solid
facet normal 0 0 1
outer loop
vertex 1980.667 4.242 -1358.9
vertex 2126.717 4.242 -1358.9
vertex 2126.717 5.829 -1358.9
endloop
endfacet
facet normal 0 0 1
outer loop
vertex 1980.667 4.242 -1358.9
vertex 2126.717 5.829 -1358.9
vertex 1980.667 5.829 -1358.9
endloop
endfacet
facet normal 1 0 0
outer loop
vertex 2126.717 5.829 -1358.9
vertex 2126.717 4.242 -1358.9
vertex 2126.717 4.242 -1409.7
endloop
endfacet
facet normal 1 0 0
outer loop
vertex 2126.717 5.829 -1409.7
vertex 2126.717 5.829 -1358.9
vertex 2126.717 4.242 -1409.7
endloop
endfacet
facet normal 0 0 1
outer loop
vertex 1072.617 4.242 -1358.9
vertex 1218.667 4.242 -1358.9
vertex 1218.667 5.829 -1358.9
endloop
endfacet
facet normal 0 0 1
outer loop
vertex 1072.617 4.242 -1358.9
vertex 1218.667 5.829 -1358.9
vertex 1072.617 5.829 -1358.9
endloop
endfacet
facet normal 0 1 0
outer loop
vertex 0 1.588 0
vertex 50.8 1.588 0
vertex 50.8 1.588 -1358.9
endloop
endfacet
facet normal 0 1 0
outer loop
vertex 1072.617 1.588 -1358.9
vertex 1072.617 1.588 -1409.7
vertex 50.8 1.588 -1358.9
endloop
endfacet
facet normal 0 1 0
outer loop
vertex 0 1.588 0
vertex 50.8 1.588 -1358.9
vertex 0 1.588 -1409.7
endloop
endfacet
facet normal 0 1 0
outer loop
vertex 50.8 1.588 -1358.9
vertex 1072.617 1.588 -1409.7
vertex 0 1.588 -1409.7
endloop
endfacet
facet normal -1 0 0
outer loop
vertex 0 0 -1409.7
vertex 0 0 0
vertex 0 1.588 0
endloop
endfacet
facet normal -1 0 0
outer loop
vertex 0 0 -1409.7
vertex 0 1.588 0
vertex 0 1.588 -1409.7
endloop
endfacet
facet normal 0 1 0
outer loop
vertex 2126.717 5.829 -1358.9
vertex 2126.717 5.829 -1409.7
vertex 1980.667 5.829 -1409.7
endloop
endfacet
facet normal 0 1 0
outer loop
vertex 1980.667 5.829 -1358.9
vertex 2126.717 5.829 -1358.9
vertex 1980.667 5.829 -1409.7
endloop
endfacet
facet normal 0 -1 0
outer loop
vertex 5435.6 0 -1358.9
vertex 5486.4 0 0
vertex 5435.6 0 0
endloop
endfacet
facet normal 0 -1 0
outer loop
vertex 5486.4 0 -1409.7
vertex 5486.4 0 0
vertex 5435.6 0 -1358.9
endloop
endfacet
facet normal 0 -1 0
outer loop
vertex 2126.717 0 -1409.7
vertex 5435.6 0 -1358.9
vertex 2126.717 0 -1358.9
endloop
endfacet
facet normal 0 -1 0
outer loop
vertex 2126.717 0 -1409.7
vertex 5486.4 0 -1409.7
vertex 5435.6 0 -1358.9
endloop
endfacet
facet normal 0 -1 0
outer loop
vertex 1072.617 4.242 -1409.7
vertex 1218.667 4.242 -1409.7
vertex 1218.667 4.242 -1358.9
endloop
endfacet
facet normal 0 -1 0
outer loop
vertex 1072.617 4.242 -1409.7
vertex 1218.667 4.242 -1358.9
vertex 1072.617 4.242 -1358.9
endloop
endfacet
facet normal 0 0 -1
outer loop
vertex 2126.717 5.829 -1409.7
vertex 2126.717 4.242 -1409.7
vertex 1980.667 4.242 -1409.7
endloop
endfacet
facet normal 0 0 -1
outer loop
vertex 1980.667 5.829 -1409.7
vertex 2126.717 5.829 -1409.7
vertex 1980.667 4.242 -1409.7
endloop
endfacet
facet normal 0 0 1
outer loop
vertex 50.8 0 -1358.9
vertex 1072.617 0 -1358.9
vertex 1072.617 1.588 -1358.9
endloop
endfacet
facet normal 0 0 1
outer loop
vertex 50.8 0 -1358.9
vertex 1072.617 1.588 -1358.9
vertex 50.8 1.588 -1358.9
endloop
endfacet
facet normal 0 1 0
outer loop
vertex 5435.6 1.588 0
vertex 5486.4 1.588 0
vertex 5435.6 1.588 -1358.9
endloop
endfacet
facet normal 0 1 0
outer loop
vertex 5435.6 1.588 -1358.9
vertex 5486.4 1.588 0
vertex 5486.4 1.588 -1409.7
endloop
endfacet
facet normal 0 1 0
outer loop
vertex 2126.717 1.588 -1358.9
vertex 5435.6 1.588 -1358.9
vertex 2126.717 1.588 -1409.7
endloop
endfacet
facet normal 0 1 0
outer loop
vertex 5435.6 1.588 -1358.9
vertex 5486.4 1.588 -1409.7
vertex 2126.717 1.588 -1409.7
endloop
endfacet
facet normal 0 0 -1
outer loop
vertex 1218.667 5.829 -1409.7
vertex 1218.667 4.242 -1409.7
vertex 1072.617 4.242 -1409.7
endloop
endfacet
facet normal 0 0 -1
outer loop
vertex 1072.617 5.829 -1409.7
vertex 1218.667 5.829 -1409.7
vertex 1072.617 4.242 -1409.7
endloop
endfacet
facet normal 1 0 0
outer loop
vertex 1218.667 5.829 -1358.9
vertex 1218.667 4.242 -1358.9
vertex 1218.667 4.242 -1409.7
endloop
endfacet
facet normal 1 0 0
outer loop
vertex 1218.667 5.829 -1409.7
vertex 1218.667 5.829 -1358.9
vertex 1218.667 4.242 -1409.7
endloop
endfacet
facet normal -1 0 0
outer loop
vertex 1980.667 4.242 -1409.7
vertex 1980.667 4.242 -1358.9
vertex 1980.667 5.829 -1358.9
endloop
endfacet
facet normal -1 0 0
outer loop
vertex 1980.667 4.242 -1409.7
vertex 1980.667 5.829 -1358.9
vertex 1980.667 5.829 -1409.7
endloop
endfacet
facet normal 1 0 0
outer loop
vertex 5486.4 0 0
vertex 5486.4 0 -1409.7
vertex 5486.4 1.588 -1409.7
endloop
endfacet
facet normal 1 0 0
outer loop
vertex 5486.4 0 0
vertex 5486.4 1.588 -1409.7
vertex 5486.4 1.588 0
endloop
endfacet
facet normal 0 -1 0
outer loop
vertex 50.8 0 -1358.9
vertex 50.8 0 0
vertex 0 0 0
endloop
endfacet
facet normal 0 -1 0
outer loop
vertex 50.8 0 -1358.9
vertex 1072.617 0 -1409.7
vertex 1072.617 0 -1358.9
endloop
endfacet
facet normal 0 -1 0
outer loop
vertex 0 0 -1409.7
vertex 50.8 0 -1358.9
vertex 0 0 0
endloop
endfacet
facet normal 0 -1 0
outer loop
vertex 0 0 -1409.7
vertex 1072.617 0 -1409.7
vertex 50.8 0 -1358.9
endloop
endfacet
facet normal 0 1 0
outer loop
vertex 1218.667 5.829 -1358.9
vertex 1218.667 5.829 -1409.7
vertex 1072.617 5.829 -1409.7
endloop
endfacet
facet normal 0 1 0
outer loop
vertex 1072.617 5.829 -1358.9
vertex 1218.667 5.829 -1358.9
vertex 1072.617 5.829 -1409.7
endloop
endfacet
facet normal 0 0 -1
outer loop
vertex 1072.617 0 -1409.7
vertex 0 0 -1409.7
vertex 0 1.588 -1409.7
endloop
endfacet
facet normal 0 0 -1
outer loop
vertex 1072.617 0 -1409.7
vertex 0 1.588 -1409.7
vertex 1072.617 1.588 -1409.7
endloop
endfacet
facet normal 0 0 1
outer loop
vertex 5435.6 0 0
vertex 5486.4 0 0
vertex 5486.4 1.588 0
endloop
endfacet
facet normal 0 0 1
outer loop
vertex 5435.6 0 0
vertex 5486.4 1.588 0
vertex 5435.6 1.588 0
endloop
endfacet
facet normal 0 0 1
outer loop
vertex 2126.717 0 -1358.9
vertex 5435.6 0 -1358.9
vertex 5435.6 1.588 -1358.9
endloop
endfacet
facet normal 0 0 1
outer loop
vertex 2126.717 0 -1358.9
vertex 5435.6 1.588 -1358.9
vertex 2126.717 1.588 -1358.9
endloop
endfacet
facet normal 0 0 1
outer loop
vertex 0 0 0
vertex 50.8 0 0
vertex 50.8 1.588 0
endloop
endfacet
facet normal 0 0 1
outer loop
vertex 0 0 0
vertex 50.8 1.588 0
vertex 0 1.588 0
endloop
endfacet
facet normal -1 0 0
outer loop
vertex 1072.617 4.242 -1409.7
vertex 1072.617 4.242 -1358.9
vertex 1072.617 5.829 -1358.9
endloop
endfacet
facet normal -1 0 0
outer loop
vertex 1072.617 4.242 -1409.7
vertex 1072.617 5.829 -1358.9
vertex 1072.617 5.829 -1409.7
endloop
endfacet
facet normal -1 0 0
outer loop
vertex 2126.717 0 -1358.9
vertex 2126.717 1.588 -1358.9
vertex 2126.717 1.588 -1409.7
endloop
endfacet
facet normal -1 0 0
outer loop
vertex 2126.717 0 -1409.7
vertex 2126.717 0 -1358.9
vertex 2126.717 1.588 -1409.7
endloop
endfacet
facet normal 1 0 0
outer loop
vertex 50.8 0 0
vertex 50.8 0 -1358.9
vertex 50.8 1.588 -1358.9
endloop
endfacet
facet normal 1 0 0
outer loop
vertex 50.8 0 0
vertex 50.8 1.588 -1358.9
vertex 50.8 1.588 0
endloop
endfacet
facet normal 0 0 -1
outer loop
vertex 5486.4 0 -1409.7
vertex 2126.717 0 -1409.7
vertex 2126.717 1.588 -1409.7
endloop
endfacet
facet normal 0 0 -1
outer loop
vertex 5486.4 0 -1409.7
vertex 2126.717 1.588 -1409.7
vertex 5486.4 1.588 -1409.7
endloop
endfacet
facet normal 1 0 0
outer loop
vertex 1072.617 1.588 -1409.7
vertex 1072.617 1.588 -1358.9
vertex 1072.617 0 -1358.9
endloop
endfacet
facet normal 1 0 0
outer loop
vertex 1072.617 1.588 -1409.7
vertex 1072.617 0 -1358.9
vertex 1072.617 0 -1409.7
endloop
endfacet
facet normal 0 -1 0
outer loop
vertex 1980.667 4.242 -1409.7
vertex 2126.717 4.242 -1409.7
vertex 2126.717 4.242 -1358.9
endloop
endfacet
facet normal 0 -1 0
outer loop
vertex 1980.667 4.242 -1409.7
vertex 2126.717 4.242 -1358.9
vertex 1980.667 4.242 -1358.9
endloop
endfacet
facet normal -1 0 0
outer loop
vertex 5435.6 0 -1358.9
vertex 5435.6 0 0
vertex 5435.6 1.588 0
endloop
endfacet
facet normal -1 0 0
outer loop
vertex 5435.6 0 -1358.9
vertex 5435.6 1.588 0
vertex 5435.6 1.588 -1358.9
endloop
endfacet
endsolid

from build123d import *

# Parameters (mm, degrees)
BOSS_EXTRUDE1_DEPTH     = 1.5875
SKETCH2_W               = 1054.1
SKETCH2_H               = 50.8
CUT_EXTRUDE1_DEPTH      = 1
CUT_EXTRUDE1_DEPTH_BACK = 2.5875
SKETCH3_W               = 146.05
SKETCH3_H               = 50.8
BOSS_EXTRUDE2_DEPTH     = 1.5875
BOSS_EXTRUDE2_2_DEPTH   = 1.5875


with BuildPart() as part:
    # Sketch1 → Boss-Extrude1 (new body)
    with BuildSketch(Plane(origin=(0, 0, 0), x_dir=(1, 0, 0), z_dir=(0, 1, 0))):
        Polygon((0, 0), (0, 1409.7), (5486.4, 1409.7), (5486.4, 0), (5435.6, 0), (5435.6, 1358.9), (50.8, 1358.9), (50.8, 0), align=None)
    extrude(amount=BOSS_EXTRUDE1_DEPTH)

    # Sketch2 → Cut-Extrude1 (cut, two sides)
    with BuildSketch(Plane(origin=(0, 1.5875, 0), x_dir=(1, 0, 0), z_dir=(0, 1, 0))) as cut_extrude1_sk:
        with Locations((1599.6666, 1384.3)):
            Rectangle(SKETCH2_W, SKETCH2_H)
    extrude(amount=CUT_EXTRUDE1_DEPTH, mode=Mode.SUBTRACT)
    extrude(cut_extrude1_sk.sketch, amount=-CUT_EXTRUDE1_DEPTH_BACK, mode=Mode.SUBTRACT)


with BuildPart() as body_2:
    # Sketch3 → Boss-Extrude2 (new body)
    with BuildSketch(Plane(origin=(0, 4.2418, 0), x_dir=(-1, 0, 0), z_dir=(0, -1, 0))):
        with Locations((-1145.6416, 1384.3)):
            Rectangle(SKETCH3_W, SKETCH3_H)
    extrude(amount=-BOSS_EXTRUDE2_DEPTH)


with BuildPart() as body_3:
    # Sketch3 → Boss-Extrude2 2 (new body)
    with BuildSketch(Plane(origin=(0, 4.2418, 0), x_dir=(-1, 0, 0), z_dir=(0, -1, 0))):
        with Locations((-2053.6916, 1384.3)):
            Rectangle(SKETCH3_W, SKETCH3_H)
    extrude(amount=-BOSS_EXTRUDE2_2_DEPTH)


solid = Compound([part.part, body_2.part, body_3.part])
